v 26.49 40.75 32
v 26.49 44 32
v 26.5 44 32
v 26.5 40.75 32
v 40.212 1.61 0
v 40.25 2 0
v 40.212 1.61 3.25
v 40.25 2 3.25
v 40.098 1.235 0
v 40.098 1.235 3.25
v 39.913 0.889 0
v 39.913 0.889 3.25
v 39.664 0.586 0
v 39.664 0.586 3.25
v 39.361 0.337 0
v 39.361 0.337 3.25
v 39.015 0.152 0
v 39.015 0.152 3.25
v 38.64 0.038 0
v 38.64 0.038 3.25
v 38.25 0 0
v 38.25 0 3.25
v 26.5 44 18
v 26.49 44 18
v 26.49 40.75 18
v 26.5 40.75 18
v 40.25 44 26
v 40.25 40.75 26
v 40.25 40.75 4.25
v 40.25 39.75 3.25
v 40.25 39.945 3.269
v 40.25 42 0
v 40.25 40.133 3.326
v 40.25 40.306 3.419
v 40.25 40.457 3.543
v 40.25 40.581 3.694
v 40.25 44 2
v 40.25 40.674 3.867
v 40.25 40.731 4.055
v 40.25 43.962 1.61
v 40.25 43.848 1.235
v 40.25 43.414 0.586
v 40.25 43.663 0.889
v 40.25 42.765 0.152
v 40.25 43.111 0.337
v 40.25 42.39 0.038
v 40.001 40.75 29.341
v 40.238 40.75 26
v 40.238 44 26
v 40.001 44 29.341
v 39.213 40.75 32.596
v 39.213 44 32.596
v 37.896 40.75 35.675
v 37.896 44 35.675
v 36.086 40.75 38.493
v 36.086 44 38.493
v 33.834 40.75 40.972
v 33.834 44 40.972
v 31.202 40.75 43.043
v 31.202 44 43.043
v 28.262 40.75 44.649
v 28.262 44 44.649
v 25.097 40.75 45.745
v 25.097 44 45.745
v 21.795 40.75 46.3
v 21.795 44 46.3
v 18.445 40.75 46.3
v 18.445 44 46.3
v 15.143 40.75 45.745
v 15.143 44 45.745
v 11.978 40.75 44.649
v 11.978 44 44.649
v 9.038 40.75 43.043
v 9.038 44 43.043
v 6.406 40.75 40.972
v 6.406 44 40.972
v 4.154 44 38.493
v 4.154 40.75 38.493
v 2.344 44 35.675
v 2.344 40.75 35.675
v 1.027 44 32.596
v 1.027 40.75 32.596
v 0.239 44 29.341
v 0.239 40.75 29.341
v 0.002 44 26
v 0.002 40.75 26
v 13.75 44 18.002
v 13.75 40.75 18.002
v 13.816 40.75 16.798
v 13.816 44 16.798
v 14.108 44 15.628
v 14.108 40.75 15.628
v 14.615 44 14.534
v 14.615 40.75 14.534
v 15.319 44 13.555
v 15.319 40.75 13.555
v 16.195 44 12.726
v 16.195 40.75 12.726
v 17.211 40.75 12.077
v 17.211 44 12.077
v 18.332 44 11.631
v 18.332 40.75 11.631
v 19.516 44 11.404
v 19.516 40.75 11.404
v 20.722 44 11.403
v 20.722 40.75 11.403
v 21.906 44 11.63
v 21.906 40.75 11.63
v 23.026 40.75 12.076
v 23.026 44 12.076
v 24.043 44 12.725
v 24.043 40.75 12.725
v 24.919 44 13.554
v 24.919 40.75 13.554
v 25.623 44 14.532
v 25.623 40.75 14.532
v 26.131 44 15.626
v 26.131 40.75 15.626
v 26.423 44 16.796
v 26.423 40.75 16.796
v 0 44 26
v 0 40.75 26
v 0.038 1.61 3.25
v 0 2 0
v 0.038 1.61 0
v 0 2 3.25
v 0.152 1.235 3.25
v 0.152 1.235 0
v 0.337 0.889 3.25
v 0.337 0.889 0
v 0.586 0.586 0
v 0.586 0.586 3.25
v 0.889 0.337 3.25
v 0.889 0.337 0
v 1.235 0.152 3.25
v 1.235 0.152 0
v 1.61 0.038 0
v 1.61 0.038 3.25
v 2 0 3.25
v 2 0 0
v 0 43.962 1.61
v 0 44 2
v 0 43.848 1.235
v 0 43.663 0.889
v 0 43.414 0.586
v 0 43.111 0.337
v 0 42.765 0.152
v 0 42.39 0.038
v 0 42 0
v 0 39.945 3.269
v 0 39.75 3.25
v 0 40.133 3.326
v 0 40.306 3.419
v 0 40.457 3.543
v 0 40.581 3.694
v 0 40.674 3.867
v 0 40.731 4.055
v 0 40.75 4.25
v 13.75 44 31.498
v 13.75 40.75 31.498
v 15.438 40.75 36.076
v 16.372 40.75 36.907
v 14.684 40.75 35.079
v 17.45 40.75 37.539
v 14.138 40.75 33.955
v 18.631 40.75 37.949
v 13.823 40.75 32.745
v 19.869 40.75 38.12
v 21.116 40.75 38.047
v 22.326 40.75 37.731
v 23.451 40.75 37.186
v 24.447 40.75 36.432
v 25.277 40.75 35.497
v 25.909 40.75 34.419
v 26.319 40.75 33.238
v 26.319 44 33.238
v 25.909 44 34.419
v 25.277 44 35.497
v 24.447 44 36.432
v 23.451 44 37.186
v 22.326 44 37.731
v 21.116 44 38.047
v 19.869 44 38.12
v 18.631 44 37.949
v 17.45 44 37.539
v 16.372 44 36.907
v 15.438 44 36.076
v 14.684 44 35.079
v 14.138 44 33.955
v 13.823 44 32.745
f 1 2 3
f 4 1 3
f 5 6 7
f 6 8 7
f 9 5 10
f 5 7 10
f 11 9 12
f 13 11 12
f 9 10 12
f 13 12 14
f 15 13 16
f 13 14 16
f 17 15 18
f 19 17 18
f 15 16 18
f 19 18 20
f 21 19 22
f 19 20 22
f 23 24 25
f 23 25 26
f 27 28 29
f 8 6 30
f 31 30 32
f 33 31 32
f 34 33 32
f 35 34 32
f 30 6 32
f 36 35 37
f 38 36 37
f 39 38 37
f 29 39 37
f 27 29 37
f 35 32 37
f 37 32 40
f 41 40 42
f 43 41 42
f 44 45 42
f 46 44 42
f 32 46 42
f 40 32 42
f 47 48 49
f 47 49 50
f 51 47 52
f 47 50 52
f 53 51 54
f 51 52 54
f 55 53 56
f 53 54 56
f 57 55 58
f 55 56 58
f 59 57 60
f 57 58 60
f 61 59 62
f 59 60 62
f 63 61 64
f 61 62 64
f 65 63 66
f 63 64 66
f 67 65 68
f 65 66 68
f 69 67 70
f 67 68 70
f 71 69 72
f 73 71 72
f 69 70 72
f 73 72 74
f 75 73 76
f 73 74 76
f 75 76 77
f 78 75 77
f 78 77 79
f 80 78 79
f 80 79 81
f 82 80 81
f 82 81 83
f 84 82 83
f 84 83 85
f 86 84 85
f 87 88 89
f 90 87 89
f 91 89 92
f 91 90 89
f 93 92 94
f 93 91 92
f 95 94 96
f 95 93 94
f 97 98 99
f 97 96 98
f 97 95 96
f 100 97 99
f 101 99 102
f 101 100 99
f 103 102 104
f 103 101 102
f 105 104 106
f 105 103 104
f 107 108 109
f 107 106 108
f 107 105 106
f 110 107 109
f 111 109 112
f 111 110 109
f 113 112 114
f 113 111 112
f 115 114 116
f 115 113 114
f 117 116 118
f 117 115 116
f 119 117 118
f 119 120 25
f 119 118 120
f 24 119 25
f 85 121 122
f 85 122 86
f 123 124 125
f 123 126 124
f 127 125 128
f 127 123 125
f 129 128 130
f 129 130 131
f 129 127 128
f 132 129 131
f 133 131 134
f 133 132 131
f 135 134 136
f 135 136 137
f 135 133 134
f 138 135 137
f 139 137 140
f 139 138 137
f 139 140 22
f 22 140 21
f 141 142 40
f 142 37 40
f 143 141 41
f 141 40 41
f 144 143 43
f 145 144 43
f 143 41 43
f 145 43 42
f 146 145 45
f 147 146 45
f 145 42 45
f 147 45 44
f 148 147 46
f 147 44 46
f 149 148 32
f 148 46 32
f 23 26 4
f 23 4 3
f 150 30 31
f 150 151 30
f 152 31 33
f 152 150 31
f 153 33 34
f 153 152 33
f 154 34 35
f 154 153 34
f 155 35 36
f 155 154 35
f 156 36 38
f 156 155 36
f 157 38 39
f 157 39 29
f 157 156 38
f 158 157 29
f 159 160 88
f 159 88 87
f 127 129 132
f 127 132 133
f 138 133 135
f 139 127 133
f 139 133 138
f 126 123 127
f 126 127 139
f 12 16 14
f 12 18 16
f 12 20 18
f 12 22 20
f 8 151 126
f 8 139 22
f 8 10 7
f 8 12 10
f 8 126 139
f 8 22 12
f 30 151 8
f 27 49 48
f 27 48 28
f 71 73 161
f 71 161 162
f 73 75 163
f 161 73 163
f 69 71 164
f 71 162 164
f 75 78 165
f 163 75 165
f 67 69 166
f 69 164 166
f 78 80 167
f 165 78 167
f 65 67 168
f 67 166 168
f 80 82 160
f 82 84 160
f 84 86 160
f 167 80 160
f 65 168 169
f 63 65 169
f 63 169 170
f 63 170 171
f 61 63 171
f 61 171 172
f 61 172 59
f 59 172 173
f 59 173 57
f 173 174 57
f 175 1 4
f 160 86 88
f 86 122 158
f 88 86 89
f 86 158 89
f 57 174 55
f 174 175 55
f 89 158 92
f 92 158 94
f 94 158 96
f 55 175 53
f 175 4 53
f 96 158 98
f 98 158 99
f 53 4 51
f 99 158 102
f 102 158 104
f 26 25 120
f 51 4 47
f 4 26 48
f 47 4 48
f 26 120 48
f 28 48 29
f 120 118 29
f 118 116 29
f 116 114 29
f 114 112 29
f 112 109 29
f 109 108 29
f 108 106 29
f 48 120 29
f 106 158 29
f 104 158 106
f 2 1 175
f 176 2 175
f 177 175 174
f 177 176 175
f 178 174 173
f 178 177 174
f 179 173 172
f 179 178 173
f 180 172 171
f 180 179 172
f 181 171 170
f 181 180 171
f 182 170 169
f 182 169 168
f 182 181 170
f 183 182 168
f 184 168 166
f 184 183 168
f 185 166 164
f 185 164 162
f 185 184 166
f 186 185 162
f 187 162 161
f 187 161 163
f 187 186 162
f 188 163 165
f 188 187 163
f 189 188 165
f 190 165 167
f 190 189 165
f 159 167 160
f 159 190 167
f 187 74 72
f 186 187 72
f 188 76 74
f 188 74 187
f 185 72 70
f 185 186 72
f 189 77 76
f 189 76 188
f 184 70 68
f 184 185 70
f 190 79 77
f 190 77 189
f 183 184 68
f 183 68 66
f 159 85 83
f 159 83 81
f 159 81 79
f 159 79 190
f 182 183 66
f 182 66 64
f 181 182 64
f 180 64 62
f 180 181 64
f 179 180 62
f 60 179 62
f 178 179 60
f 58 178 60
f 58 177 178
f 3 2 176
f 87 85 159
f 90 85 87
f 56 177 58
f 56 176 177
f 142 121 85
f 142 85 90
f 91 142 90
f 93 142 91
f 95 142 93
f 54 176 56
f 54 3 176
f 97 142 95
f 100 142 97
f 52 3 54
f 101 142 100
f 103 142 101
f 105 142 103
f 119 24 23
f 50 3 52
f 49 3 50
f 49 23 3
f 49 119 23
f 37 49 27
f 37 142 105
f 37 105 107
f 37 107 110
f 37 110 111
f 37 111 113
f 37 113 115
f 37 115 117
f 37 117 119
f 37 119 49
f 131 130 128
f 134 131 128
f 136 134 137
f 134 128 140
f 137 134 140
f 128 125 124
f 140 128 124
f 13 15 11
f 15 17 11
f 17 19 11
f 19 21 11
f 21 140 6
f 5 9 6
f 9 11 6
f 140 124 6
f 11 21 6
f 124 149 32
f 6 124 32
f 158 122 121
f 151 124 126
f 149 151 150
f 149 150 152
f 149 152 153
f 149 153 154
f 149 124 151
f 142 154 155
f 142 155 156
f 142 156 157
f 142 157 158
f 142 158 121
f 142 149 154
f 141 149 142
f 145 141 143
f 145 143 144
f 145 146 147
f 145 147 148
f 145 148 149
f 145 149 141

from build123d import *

# Parameters (mm, degrees)
BOX008_W          = 12.75
BOX008_H          = 3.25
BOX008_DEPTH      = 14
CYLINDER004_R     = 6.375
CYLINDER004_DEPTH = 3.25
CYLINDER002_R     = 6.375
CYLINDER002_DEPTH = 3.25
BOX009_W          = 40.25
BOX009_H          = 3.25
BOX009_DEPTH      = 26
BOX007_W          = 40.25
BOX007_H          = 44
BOX007_DEPTH      = 3.25
CYLINDER003_R     = 20.12
CYLINDER003_DEPTH = 3.25
FILLET008_1_R     = 2
FILLET008_2_R     = 1


with BuildPart() as cube004:
    # Box008 → Box008 (new body)
    with BuildSketch(Plane(origin=(13.75, 40.75, 18), x_dir=(1, 0, 0), z_dir=(0, 0, 1))):
        with Locations((6.375, 1.625)):
            Rectangle(BOX008_W, BOX008_H)
    extrude(amount=BOX008_DEPTH)


with BuildPart() as cylinder004:
    # Cylinder004 → Cylinder004 (new body)
    with BuildSketch(Plane(origin=(20.12, 44, 17.75), x_dir=(1, 0, 0), z_dir=(0, -1, 0))):
        Circle(CYLINDER004_R)
    extrude(amount=CYLINDER004_DEPTH)


with BuildPart() as cylinder002:
    # Cylinder002 → Cylinder002 (new body)
    with BuildSketch(Plane(origin=(20.12, 44, 31.75), x_dir=(1, 0, 0), z_dir=(0, -1, 0))):
        Circle(CYLINDER002_R)
    extrude(amount=CYLINDER002_DEPTH)


with BuildPart() as cube005:
    # Box009 → Box009 (new body)
    with BuildSketch(Plane(origin=(0, 40.75, 0), x_dir=(1, 0, 0), z_dir=(0, 0, 1))):
        with Locations((20.125, 1.625)):
            Rectangle(BOX009_W, BOX009_H)
    extrude(amount=BOX009_DEPTH)


with BuildPart() as fusion:
    # Box007 → Box007 (new body)
    with BuildSketch(Plane.XY):
        with Locations((20.125, 22)):
            Rectangle(BOX007_W, BOX007_H)
    extrude(amount=BOX007_DEPTH)

    # Fusion: union Cube005
    add(cube005.part)


with BuildPart() as fillet008:
    # Cylinder003 → Cylinder003 (new body)
    with BuildSketch(Plane(origin=(20.12, 44, 26.25), x_dir=(1, 0, 0), z_dir=(0, -1, 0))):
        Circle(CYLINDER003_R)
    extrude(amount=CYLINDER003_DEPTH)

    # Fusion001: union Fusion
    add(fusion.part)

    # Cut: cut Cylinder002
    add(cylinder002.part, mode=Mode.SUBTRACT)

    # Cut001: cut Cylinder004
    add(cylinder004.part, mode=Mode.SUBTRACT)

    # Cut002: cut Cube004
    add(cube004.part, mode=Mode.SUBTRACT)

    # Fillet008 1
    fillet008_1_edges = [fillet008.edges().sort_by_distance(p)[0] for p in [
        (20.125, 44, 0),
        (40.25, 0, 1.625),
        (0, 0, 1.625),
    ]]
    fillet(fillet008_1_edges, radius=FILLET008_1_R)

    # Fillet008 2
    fillet008_2_edges = [fillet008.edges().sort_by_distance(p)[0] for p in [
        (20.125, 40.75, 3.25),
    ]]
    fillet(fillet008_2_edges, radius=FILLET008_2_R)


solid = fillet008.part
